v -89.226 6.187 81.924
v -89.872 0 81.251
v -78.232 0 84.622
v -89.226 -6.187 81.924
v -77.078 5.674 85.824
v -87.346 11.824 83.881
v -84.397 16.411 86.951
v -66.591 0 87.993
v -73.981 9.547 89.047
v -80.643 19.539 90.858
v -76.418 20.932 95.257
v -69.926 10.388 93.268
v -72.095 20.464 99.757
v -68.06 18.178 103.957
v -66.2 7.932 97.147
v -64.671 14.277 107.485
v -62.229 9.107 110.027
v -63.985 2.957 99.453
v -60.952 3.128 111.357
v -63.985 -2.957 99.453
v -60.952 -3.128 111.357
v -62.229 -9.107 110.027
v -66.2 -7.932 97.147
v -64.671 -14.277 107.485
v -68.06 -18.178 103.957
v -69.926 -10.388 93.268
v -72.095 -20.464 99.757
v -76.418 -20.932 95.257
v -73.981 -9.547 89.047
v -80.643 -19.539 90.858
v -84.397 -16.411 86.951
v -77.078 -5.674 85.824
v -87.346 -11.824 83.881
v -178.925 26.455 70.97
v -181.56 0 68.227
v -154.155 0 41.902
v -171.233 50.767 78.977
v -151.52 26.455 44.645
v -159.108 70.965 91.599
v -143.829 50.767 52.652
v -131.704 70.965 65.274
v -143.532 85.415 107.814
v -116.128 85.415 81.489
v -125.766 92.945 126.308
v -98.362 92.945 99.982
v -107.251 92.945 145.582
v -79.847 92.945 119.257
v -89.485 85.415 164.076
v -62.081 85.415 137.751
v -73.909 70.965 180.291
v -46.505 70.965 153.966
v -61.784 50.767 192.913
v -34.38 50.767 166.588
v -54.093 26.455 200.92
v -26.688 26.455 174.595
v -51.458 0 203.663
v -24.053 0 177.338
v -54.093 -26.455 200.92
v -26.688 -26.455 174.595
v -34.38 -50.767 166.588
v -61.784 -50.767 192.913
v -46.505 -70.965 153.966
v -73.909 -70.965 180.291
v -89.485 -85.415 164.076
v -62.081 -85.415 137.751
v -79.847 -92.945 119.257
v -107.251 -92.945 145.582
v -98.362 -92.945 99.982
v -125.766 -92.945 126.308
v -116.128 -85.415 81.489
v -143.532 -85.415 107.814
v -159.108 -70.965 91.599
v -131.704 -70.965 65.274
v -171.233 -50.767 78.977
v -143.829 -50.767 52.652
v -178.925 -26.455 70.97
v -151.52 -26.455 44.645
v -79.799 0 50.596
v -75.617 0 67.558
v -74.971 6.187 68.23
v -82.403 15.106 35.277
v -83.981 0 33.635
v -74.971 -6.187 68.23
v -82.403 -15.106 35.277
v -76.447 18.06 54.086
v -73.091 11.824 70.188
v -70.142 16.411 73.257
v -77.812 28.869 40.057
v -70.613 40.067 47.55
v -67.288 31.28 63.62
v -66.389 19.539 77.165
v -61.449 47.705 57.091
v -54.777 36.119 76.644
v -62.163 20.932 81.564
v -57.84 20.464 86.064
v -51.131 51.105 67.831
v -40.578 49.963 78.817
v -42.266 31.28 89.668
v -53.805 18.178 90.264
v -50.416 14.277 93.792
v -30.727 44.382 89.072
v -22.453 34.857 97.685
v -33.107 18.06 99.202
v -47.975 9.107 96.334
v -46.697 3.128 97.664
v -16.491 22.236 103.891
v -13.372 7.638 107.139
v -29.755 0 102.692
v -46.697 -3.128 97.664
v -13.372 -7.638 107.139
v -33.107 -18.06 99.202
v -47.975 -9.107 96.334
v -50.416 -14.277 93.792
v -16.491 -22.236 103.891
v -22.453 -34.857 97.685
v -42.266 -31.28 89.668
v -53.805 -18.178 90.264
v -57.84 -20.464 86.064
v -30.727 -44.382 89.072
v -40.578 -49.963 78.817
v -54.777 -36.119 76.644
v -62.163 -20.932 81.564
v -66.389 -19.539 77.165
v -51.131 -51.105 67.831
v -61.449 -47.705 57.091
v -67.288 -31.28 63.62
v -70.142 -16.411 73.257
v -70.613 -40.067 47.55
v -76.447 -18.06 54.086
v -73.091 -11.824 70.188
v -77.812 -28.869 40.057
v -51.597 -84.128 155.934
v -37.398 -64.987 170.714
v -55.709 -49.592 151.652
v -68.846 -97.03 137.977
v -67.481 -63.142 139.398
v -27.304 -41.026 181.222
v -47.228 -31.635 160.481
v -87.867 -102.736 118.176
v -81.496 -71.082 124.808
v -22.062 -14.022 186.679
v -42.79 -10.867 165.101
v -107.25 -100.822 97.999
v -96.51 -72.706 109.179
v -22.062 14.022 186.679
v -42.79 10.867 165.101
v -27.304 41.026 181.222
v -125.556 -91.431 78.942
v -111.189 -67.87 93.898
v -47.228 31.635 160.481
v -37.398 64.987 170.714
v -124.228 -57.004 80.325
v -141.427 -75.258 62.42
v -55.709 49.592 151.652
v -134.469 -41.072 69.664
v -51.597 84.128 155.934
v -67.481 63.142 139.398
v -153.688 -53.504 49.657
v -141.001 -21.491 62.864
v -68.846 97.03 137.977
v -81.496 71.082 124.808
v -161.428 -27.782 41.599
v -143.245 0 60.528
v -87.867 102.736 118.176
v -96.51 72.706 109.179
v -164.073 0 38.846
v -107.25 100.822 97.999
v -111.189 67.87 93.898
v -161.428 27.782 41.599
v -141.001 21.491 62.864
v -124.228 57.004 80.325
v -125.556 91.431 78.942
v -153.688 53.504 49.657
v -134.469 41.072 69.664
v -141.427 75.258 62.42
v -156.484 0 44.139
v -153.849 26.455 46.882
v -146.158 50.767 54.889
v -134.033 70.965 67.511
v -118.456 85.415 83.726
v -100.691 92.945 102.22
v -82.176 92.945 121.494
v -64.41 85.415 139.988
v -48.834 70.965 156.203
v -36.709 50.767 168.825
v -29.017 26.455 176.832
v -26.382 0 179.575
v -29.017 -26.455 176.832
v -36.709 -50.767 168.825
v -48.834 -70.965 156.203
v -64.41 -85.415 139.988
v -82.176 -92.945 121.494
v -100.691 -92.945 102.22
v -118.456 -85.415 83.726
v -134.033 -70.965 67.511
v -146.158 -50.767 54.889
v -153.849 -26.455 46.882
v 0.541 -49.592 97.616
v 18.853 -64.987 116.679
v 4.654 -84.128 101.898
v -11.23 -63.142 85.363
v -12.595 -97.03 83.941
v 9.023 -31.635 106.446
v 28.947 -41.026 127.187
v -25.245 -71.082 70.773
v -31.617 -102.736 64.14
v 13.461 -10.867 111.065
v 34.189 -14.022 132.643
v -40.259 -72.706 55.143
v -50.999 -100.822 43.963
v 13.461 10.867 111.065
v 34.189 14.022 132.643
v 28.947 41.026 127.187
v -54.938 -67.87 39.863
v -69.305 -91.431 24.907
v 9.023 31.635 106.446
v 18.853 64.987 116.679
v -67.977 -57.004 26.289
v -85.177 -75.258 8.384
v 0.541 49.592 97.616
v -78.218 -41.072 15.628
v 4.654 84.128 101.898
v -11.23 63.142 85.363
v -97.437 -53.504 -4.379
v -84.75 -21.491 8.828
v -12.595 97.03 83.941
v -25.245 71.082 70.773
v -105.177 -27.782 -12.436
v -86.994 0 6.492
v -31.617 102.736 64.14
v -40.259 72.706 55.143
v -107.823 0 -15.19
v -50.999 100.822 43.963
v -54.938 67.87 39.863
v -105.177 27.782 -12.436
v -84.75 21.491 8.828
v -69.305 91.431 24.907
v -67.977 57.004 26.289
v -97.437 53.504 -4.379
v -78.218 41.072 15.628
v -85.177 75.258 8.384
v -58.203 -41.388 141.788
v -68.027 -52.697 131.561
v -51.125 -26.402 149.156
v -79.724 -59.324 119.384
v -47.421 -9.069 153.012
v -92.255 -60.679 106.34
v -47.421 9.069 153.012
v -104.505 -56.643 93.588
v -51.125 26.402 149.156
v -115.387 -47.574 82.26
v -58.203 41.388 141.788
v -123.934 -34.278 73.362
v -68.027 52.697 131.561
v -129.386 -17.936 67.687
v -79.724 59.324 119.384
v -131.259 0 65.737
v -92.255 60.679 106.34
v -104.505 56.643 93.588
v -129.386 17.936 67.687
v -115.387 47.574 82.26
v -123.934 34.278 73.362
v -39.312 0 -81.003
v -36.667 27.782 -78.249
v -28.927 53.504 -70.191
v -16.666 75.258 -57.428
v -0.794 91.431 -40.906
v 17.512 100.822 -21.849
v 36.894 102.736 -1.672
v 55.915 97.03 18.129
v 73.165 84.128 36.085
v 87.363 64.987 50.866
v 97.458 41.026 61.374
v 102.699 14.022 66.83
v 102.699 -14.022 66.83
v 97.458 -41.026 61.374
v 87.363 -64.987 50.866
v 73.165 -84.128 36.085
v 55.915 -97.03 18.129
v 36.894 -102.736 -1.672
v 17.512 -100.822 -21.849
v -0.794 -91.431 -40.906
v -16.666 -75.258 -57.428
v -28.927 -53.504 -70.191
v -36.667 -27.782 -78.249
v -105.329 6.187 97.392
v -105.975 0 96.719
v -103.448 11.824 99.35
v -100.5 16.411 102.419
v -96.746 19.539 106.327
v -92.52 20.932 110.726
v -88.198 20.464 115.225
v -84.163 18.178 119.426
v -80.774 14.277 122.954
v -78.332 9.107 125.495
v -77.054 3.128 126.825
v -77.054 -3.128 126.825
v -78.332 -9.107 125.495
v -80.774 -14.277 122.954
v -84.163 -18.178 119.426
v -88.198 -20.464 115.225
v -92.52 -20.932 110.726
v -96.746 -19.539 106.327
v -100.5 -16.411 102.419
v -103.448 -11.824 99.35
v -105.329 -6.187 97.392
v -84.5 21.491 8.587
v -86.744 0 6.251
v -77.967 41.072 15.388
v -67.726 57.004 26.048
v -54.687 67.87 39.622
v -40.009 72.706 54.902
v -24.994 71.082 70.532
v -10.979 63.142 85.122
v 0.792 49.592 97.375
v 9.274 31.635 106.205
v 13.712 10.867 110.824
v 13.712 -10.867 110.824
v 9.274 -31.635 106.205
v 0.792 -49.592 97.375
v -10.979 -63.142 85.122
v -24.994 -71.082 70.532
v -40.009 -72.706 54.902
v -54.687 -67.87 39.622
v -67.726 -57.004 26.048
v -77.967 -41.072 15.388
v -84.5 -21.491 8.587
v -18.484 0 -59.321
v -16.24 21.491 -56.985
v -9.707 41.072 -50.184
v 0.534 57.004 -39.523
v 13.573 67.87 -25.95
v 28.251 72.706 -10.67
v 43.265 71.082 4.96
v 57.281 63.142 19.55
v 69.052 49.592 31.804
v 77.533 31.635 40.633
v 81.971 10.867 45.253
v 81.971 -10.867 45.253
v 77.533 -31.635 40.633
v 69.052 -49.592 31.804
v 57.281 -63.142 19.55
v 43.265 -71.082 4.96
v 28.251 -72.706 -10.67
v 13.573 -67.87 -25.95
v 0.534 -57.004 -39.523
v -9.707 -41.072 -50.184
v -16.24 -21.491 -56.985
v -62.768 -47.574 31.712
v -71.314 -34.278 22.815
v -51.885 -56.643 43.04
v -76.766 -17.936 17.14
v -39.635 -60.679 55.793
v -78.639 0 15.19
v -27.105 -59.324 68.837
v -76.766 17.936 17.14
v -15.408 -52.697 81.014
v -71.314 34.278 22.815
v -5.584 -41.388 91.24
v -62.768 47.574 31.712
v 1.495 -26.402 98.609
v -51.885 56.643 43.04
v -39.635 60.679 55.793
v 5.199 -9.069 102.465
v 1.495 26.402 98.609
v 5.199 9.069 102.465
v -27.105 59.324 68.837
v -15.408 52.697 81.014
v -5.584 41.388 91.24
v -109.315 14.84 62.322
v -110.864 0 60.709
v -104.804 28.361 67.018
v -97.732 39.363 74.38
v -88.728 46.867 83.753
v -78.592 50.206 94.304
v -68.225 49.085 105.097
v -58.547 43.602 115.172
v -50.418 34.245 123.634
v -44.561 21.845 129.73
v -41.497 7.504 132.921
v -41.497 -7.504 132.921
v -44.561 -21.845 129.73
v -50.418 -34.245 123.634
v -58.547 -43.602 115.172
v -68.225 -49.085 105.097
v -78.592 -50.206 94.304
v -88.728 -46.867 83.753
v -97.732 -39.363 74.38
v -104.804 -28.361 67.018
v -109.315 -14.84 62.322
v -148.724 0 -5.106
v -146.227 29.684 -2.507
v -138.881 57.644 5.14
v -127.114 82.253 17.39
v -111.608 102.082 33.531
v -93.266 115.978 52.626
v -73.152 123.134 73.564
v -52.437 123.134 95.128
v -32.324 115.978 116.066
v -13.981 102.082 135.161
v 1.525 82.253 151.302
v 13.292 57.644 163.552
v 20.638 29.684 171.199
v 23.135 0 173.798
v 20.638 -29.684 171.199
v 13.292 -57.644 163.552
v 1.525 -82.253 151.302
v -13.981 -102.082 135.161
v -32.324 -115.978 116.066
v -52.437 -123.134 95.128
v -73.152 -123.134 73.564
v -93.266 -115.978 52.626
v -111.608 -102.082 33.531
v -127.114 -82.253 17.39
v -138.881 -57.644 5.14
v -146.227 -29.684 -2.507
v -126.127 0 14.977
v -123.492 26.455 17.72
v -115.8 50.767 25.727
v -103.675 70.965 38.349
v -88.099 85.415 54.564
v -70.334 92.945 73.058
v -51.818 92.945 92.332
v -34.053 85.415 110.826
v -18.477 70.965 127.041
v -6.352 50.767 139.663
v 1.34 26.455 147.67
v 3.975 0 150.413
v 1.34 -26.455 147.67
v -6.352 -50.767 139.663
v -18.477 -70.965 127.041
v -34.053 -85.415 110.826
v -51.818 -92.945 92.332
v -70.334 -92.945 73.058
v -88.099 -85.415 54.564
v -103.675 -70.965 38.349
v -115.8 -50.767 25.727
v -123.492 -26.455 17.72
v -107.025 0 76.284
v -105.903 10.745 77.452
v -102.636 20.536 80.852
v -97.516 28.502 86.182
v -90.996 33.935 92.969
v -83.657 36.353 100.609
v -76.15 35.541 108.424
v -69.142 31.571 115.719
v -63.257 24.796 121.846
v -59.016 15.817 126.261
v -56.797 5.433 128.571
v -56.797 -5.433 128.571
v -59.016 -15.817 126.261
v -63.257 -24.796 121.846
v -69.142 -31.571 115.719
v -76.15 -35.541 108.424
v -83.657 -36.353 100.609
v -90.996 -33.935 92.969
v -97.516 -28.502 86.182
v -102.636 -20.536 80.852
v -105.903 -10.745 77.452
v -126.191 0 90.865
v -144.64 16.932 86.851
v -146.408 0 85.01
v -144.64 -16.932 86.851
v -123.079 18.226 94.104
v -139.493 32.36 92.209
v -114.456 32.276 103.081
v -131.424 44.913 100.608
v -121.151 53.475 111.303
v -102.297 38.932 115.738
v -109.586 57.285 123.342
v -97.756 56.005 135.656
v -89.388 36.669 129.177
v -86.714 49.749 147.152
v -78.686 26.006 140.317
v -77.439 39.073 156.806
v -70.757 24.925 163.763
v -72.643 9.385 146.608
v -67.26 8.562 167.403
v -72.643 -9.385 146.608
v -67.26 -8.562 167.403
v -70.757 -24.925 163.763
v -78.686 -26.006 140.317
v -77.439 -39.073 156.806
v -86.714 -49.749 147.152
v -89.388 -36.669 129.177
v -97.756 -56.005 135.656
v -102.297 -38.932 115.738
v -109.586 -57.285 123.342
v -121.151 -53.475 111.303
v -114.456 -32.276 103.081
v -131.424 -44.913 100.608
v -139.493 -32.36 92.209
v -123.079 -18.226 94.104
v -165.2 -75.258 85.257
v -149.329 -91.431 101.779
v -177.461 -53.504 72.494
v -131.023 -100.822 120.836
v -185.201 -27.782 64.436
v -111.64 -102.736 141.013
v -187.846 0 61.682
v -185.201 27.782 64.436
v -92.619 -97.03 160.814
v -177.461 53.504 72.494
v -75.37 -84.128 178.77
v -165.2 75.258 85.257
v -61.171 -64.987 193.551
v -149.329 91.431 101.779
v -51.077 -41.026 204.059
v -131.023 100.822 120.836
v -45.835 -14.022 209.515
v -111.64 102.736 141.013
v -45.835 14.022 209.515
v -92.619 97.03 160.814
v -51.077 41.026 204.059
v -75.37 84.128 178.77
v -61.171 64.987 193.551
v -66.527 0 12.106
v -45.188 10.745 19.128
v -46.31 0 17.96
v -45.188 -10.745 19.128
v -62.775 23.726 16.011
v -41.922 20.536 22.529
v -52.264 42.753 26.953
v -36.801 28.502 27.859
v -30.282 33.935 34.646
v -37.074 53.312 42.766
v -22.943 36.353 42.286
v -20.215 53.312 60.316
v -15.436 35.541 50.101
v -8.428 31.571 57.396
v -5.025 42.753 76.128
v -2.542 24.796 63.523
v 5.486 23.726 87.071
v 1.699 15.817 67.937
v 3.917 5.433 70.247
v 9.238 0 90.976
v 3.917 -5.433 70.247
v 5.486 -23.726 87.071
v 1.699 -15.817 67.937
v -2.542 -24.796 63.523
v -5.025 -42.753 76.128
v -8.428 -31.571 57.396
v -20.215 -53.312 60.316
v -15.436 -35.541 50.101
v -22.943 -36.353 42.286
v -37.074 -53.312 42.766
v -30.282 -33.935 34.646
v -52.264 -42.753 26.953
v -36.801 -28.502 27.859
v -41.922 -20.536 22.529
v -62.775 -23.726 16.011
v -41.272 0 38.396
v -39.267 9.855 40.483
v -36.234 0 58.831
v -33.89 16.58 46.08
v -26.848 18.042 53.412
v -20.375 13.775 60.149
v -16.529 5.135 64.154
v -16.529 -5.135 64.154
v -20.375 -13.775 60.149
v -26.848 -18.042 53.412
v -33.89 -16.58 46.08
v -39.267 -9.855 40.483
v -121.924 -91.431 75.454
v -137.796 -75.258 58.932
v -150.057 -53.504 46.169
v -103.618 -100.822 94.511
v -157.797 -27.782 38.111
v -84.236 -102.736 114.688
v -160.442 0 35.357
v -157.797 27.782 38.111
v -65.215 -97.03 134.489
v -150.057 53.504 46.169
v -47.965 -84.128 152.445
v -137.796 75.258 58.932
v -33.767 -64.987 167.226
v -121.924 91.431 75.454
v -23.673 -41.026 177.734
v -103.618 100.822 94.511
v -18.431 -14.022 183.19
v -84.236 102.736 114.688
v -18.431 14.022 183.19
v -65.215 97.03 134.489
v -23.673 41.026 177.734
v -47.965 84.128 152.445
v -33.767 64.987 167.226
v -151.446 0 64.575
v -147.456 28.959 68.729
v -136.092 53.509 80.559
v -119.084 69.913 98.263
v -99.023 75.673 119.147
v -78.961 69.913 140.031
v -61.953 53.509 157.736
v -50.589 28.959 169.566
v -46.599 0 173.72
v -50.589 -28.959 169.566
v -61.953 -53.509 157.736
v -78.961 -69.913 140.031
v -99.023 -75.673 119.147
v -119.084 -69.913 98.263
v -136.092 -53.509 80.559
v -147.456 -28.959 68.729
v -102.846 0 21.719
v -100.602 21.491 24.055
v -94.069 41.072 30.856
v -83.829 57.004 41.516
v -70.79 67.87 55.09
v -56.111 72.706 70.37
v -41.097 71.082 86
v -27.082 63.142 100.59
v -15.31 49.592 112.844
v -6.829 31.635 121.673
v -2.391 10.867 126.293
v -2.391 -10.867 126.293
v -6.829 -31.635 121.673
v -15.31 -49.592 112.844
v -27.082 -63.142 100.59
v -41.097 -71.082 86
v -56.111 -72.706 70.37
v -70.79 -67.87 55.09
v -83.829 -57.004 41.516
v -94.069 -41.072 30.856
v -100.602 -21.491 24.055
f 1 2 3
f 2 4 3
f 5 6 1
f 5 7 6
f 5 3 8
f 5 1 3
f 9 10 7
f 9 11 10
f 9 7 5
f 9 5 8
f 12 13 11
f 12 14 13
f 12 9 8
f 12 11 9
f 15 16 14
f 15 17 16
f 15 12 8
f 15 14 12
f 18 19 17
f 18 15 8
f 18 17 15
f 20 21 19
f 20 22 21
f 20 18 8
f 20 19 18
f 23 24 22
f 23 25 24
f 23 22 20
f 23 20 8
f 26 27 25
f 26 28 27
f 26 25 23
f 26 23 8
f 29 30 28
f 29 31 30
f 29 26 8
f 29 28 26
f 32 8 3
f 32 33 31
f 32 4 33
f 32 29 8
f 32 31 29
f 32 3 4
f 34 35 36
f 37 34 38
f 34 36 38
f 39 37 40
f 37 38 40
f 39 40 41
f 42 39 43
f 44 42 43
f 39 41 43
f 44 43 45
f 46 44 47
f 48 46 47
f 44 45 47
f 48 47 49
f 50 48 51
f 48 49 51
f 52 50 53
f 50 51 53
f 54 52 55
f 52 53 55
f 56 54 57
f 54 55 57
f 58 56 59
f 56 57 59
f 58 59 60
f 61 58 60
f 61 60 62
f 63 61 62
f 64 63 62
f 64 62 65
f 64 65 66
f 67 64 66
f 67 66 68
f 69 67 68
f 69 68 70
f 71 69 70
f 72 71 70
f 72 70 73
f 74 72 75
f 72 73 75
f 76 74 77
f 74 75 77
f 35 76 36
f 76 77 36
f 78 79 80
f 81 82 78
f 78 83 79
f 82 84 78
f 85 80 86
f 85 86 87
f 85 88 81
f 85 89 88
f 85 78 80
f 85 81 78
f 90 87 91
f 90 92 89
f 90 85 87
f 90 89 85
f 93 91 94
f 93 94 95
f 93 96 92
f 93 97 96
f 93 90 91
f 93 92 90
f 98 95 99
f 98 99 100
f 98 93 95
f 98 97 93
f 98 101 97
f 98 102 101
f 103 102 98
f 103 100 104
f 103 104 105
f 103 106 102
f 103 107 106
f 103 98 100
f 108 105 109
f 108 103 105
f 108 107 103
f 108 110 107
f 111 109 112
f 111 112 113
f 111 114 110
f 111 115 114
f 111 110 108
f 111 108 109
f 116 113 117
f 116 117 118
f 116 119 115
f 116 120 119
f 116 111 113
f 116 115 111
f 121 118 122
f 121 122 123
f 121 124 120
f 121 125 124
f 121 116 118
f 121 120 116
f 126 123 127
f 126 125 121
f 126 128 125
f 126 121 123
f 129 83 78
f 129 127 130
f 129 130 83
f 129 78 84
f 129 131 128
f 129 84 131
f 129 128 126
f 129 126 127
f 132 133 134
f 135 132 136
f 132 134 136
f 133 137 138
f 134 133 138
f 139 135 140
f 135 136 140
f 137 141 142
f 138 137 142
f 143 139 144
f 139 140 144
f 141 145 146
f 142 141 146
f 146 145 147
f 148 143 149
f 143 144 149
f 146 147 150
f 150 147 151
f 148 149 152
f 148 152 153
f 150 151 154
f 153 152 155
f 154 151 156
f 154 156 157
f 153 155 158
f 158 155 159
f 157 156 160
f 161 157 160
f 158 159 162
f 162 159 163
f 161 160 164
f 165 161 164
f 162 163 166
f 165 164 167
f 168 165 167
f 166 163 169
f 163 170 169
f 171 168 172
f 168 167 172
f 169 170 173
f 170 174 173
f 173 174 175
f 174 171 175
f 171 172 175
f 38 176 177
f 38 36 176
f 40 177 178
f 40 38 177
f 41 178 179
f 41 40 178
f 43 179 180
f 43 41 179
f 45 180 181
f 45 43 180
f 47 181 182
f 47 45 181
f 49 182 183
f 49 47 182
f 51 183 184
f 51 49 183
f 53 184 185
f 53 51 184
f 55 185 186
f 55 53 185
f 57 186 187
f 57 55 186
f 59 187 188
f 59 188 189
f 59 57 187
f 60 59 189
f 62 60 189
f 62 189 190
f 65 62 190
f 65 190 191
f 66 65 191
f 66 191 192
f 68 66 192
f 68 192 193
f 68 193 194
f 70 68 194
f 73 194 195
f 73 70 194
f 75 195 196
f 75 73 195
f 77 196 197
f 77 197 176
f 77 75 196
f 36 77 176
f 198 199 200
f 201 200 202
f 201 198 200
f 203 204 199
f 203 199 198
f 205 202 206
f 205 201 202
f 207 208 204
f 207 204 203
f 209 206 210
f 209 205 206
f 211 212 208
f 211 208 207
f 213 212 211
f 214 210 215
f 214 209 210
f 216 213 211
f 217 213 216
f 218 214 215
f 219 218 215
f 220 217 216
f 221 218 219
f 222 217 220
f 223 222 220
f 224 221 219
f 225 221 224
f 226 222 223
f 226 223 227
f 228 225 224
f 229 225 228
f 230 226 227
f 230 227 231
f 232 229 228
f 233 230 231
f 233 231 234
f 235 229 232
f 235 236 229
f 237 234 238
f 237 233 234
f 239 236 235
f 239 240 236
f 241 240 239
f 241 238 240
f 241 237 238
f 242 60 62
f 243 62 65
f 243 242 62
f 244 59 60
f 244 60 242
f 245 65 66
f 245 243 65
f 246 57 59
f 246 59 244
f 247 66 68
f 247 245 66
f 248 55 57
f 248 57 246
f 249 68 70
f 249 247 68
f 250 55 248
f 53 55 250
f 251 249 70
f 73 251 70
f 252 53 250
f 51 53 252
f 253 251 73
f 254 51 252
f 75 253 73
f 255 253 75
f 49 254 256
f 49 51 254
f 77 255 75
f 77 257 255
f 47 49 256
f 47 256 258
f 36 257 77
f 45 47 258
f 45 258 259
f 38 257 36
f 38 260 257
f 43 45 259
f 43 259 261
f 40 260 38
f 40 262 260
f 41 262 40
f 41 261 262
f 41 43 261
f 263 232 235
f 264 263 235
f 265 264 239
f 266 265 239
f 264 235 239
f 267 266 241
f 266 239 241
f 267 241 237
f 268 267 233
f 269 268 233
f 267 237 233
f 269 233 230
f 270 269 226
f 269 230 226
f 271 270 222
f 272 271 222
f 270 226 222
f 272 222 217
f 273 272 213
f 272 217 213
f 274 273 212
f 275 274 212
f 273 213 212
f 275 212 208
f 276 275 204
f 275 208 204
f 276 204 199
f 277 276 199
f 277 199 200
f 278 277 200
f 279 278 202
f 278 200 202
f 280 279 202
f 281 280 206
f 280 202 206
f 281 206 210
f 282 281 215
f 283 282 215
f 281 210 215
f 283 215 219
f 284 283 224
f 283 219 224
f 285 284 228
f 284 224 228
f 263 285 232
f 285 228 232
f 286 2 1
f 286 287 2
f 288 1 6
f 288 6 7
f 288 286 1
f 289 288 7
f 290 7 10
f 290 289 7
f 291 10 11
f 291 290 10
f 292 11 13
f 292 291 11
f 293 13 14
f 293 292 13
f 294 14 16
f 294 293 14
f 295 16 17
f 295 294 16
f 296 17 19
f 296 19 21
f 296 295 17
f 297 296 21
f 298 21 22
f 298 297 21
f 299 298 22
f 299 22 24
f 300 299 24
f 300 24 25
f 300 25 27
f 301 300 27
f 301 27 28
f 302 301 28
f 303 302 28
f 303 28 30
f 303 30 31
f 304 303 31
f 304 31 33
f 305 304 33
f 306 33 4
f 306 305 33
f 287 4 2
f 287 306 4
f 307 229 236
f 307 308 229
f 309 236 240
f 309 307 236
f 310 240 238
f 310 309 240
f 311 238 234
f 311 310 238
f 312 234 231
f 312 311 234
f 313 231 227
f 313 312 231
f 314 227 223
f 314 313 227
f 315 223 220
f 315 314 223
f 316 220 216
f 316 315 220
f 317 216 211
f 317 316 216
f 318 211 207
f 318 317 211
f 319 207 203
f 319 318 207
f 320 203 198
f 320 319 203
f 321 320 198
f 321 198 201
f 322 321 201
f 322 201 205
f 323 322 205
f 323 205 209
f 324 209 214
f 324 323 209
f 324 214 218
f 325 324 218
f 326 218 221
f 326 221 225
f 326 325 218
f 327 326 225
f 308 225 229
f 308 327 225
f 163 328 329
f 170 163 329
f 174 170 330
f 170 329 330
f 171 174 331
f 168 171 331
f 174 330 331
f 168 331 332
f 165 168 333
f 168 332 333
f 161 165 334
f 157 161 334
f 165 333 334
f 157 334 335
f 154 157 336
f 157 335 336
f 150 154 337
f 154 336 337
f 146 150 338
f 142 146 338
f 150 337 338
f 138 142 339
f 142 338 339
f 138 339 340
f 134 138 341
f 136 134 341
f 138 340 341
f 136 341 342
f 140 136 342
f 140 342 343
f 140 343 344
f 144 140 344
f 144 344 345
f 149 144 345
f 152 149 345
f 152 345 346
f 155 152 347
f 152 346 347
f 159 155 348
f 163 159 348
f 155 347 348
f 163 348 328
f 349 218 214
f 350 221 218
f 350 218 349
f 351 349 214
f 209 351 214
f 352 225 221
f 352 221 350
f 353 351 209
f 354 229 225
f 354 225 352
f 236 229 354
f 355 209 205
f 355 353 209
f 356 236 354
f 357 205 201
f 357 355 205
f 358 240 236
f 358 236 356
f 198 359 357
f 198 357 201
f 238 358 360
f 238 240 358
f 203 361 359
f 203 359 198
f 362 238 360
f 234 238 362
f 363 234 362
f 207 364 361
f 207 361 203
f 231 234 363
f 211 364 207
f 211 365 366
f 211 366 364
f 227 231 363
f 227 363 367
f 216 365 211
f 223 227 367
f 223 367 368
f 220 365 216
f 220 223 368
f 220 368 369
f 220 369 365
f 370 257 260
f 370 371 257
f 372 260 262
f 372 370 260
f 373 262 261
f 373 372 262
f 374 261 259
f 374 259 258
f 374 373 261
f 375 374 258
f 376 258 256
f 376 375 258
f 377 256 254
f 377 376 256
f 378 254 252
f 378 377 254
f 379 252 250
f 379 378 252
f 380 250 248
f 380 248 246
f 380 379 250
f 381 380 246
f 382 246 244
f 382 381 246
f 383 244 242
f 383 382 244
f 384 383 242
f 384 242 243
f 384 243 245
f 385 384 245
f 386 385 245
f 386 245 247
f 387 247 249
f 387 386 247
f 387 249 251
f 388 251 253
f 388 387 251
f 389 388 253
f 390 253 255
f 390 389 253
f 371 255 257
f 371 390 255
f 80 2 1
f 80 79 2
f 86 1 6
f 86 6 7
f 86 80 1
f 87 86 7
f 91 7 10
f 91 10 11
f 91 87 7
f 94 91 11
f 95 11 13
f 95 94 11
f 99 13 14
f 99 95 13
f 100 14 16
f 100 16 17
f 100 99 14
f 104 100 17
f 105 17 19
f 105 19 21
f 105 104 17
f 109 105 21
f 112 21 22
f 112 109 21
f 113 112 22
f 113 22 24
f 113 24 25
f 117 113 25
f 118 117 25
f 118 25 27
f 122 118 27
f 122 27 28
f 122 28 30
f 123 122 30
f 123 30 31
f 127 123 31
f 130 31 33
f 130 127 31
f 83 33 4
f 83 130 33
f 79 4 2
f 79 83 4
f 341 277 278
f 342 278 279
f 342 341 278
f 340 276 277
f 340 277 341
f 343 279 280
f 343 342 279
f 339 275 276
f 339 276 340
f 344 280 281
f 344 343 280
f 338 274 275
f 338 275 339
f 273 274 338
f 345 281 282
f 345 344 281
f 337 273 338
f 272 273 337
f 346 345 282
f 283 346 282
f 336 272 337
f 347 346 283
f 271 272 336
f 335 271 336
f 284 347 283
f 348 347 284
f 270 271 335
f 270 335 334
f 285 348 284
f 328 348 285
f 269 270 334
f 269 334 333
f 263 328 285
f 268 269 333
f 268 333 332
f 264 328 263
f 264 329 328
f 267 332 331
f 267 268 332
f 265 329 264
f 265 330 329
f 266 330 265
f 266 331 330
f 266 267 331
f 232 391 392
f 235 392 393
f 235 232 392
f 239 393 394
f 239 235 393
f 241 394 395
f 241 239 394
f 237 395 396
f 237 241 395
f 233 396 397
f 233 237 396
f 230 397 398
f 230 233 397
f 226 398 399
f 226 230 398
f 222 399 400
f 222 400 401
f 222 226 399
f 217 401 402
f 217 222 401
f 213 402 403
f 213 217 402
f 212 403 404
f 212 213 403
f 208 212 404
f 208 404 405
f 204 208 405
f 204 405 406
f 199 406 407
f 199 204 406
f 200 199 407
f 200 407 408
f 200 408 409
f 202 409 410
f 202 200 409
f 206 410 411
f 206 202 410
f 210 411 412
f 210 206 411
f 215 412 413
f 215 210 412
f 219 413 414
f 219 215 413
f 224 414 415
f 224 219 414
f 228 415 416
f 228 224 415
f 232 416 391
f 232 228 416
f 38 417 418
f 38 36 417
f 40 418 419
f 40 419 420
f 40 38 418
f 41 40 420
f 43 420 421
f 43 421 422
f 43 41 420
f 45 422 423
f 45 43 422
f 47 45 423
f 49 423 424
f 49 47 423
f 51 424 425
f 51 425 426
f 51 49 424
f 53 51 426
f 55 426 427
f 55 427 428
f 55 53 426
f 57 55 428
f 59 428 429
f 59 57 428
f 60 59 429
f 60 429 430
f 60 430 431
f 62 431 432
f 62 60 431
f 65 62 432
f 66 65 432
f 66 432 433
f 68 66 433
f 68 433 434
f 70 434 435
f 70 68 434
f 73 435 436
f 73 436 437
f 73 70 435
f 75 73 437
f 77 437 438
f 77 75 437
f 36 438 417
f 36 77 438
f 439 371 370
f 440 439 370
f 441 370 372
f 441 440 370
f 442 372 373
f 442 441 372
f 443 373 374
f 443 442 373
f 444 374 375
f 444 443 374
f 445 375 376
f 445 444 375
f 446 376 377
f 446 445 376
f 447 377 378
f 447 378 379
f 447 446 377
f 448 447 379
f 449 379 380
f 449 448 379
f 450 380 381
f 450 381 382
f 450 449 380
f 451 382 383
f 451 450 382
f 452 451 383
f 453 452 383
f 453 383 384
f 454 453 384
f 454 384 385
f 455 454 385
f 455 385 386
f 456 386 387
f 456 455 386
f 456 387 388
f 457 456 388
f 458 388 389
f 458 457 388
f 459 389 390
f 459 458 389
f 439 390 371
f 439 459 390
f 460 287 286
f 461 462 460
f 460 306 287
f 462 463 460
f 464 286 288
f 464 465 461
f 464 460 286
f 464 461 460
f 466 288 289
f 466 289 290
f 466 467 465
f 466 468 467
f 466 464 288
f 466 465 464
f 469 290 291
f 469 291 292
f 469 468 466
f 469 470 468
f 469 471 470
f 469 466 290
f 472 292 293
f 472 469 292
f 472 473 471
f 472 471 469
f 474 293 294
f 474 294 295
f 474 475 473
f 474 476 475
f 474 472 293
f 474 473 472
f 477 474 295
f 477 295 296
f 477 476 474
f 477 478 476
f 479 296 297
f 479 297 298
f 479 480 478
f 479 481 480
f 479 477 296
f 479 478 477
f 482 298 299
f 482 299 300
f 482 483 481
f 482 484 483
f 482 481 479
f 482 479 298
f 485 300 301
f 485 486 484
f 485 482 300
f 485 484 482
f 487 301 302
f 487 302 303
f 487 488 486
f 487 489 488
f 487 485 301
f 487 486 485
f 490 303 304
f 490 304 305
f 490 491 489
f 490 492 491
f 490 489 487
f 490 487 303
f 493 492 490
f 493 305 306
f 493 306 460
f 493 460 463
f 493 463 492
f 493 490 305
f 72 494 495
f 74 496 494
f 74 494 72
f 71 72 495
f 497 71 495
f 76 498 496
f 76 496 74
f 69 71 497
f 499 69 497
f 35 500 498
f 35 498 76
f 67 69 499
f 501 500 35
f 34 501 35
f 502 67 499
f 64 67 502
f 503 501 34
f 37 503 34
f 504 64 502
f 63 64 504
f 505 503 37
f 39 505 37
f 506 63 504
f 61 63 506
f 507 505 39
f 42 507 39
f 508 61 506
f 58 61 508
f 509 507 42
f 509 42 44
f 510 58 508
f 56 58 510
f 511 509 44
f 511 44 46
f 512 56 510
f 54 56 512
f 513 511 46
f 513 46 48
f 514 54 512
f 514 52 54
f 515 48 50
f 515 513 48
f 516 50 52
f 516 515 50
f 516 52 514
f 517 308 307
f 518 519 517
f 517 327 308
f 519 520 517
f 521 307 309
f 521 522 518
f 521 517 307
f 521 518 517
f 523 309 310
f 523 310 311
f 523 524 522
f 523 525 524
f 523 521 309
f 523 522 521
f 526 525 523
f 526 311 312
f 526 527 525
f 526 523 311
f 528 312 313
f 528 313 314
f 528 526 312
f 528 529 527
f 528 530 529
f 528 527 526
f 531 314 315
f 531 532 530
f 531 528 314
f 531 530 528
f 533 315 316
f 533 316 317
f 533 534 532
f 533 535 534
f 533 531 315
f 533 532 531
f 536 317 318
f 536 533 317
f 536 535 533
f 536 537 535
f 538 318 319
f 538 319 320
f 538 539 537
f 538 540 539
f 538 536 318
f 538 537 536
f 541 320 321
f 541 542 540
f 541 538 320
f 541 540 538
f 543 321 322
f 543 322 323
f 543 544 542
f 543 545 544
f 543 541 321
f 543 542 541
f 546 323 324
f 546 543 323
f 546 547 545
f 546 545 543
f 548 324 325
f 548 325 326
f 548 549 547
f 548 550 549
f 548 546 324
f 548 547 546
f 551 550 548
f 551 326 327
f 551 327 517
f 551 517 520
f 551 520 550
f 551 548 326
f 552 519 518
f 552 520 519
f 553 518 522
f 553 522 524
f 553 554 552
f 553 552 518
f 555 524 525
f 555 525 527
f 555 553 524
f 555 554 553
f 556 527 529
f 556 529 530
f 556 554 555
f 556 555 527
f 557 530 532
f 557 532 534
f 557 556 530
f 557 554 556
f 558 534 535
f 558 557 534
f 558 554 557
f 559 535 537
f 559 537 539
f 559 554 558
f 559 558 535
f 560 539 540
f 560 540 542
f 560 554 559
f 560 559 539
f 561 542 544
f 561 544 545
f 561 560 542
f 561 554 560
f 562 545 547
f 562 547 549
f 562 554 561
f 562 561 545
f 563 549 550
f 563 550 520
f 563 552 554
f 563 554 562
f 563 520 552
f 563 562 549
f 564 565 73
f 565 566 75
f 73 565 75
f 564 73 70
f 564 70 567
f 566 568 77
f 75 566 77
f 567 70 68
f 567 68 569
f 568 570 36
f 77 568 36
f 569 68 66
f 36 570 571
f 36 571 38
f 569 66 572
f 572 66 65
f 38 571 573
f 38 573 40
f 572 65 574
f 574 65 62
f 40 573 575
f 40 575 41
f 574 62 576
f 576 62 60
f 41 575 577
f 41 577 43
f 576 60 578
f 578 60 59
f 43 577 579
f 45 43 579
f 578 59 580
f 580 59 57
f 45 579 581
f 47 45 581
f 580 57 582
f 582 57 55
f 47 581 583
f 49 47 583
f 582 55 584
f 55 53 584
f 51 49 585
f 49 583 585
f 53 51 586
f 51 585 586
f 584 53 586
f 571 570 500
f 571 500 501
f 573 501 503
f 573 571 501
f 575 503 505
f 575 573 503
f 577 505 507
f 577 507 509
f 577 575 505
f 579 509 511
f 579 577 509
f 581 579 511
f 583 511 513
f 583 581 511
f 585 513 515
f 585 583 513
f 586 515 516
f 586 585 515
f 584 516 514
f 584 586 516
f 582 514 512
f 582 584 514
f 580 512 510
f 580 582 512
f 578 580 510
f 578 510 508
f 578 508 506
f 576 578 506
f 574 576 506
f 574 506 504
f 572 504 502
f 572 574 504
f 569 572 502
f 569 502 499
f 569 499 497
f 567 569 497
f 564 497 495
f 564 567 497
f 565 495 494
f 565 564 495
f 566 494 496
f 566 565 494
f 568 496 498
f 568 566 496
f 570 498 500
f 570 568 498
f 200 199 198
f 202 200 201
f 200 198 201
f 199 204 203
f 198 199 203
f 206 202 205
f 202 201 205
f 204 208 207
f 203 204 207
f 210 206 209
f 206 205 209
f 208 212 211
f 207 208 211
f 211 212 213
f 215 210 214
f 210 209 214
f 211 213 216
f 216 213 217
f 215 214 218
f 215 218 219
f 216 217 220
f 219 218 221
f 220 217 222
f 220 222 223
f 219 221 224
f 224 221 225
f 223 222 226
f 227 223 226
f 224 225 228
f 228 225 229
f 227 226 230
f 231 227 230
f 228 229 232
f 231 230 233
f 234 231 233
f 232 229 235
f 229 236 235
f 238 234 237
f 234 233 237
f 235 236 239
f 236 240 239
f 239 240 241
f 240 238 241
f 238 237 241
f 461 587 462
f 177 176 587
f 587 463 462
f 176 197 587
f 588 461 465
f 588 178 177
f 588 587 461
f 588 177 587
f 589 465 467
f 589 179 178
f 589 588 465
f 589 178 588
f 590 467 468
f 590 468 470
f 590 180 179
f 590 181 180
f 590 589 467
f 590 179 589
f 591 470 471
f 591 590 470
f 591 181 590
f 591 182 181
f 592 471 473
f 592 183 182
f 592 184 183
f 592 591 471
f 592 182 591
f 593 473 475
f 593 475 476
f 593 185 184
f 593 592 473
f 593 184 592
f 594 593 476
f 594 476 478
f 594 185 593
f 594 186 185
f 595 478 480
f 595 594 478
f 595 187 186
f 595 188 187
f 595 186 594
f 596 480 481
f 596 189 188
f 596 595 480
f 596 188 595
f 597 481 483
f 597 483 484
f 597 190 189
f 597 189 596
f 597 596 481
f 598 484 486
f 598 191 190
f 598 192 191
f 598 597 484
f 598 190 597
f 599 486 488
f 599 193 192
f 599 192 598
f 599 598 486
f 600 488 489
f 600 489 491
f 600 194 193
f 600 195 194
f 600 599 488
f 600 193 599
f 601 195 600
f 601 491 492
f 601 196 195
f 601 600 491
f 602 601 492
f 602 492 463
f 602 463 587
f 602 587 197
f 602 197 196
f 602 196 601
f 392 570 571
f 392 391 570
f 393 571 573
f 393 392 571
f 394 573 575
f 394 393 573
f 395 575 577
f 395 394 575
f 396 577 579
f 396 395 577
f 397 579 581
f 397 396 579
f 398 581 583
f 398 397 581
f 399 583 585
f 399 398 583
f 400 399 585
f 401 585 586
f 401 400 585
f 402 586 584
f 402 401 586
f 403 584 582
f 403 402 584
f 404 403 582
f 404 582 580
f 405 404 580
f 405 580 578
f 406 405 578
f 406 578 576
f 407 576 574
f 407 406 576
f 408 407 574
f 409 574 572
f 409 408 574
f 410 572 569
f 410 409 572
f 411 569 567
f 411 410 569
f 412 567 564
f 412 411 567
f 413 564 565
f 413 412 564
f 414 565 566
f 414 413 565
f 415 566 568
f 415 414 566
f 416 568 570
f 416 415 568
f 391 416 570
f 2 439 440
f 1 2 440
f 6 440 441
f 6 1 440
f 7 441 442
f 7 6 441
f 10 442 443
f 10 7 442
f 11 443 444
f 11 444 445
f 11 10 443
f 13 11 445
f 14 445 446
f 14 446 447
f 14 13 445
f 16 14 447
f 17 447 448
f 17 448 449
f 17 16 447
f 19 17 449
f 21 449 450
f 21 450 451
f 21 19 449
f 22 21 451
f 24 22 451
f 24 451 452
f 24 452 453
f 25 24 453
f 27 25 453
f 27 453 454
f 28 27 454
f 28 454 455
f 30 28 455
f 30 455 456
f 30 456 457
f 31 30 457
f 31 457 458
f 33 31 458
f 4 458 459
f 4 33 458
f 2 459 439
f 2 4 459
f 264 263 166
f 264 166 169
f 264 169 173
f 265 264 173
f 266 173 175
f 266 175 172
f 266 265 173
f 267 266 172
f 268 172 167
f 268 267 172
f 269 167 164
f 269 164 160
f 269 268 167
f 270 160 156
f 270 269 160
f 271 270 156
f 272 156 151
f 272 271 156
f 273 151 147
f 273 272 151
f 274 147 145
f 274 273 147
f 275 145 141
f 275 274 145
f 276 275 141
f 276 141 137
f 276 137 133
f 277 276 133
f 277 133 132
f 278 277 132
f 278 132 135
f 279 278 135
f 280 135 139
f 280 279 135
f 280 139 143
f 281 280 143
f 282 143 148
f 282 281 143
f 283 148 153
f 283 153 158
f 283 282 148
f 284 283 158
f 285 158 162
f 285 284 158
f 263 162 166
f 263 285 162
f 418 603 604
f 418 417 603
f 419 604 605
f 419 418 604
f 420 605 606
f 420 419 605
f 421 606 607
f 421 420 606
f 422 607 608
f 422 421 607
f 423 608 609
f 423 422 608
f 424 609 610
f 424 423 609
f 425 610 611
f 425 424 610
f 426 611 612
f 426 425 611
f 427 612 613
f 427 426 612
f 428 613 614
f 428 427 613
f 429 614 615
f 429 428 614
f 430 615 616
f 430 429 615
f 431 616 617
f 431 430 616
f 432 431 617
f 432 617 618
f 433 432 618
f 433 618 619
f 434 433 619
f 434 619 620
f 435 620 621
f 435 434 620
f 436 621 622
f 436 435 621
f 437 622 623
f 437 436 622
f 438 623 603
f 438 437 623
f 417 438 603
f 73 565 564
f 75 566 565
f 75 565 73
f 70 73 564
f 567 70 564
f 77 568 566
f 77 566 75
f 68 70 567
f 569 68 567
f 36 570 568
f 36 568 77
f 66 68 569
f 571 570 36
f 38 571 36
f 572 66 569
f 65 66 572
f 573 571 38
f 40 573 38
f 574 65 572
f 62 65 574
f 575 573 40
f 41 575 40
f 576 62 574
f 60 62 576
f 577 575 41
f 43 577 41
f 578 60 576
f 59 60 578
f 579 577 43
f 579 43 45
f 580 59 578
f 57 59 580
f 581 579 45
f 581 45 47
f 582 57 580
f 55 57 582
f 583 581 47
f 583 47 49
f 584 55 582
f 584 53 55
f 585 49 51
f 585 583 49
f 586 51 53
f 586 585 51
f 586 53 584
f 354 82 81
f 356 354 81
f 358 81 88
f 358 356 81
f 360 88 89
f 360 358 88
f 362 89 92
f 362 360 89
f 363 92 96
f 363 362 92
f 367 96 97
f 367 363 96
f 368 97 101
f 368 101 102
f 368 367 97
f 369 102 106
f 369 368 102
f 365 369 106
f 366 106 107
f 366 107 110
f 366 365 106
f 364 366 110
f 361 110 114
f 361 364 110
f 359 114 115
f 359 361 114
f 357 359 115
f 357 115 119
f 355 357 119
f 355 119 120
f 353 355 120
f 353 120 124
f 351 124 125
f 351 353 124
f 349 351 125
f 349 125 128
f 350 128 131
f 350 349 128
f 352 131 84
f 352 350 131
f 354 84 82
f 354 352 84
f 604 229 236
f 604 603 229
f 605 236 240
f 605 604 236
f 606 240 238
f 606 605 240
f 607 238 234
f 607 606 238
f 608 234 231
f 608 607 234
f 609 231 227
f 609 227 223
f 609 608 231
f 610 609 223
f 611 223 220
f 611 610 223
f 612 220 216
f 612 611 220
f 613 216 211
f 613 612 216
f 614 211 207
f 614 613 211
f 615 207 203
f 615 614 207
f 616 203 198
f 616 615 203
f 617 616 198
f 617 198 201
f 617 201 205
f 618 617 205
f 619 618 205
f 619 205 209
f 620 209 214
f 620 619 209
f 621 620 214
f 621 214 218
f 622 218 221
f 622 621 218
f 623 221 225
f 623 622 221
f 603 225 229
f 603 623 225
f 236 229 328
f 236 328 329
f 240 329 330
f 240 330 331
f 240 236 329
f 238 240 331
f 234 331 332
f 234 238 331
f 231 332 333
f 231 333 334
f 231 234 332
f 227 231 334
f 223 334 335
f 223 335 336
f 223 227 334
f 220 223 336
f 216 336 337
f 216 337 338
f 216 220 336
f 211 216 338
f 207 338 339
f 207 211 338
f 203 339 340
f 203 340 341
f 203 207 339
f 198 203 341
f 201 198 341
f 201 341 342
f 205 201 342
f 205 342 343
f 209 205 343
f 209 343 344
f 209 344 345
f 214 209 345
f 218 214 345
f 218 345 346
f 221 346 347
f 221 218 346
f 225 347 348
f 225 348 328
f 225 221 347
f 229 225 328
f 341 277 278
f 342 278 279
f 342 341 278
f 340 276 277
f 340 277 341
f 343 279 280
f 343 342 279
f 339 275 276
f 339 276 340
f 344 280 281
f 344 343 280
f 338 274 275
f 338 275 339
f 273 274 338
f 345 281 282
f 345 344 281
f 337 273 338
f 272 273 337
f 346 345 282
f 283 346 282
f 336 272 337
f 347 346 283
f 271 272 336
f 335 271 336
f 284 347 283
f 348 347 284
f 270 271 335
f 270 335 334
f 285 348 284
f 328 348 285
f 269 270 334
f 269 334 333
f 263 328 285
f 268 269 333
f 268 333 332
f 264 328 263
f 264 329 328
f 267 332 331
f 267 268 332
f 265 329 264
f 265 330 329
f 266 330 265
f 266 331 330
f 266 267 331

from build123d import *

# Parameters (mm, degrees)
F2_DEPTH = 38
F3_DEPTH = 95
F4_DEPTH = 173


with BuildPart() as f1:
    # F0 (on Front) → F1 (revolve)
    with BuildSketch(Plane.XZ):
        Polygon((-107.8225609797, -15.1899719095), (-86.9944029931, 6.4920546009), (-102.8459925252, 21.7193863706), (-126.1271058847, 14.9773151046), (-154.155441743, 41.9018559024), (-160.4421672051, 35.3574006403), (-148.7241336666, -5.106257544), align=None)
    revolve(axis=Axis((-51.4125548803, 0, 73.4122700717), (0.7211644127, 0, -0.6927639496)))


with BuildPart() as f1b:
    # F0 (on Front) → F1, piece 2 (revolve)
    with BuildSketch(Plane.XZ):
        Polygon((-107.0246264672, 76.2838601884), (-89.8722972673, 81.2510721966), (-105.9747368764, 96.7193752164), (-146.4081794357, 85.0100919422), (-156.4843639398, 44.1390618864), (-154.155441743, 41.9018559024), (-131.2586280567, 65.7373444592), (-110.8642921288, 60.709404342), align=None)
    revolve(axis=Axis((-51.4125548803, 0, 73.4122700717), (0.7211644127, 0, -0.6927639496)))


with BuildPart() as f1c:
    # F0 (on Front) → F1, piece 3 (revolve)
    with BuildSketch(Plane.XZ):
        Polygon((-46.3101103569, 17.9603666249), (-36.2339258527, 58.8313966808), (-66.5911839079, 87.9931434625), (-89.8722972673, 81.2510721966), (-75.6174788212, 67.5576284346), (-83.9806131832, 33.6350741456), (-78.6390218312, 15.1899719095), (-86.9944029931, 6.4920546009), (-86.7435529162, 6.2510833508), align=None)
    revolve(axis=Axis((-51.4125548803, 0, 73.4122700717), (0.7211644127, 0, -0.6927639496)))


with BuildPart() as f2:
    # F2 (new): a face of the model
    f2_faces = [f1.part.faces().sort_by_distance(p)[0] for p in [
        (-22.0355853047, 0, 179.4380812225),
    ]]
    extrude(f2_faces, amount=F2_DEPTH)


with BuildPart() as f3:
    # F3 (new): a face of the model
    f3_faces = [f1.part.faces().sort_by_distance(p)[0] for p in [
        (32.8352718578, 0, 131.2342516077),
    ]]
    extrude(f3_faces, amount=F3_DEPTH)


with BuildPart() as f4:
    # F4 (new): a face of the model
    f4_faces = [f3.part.faces().sort_by_distance(p)[0] for p in [
        (101.345891061, 0, 65.421676393),
    ]]
    extrude(f4_faces, amount=-F4_DEPTH)


solid = Compound([f1.part, f1b.part, f1c.part, f2.part, f3.part, f4.part])
